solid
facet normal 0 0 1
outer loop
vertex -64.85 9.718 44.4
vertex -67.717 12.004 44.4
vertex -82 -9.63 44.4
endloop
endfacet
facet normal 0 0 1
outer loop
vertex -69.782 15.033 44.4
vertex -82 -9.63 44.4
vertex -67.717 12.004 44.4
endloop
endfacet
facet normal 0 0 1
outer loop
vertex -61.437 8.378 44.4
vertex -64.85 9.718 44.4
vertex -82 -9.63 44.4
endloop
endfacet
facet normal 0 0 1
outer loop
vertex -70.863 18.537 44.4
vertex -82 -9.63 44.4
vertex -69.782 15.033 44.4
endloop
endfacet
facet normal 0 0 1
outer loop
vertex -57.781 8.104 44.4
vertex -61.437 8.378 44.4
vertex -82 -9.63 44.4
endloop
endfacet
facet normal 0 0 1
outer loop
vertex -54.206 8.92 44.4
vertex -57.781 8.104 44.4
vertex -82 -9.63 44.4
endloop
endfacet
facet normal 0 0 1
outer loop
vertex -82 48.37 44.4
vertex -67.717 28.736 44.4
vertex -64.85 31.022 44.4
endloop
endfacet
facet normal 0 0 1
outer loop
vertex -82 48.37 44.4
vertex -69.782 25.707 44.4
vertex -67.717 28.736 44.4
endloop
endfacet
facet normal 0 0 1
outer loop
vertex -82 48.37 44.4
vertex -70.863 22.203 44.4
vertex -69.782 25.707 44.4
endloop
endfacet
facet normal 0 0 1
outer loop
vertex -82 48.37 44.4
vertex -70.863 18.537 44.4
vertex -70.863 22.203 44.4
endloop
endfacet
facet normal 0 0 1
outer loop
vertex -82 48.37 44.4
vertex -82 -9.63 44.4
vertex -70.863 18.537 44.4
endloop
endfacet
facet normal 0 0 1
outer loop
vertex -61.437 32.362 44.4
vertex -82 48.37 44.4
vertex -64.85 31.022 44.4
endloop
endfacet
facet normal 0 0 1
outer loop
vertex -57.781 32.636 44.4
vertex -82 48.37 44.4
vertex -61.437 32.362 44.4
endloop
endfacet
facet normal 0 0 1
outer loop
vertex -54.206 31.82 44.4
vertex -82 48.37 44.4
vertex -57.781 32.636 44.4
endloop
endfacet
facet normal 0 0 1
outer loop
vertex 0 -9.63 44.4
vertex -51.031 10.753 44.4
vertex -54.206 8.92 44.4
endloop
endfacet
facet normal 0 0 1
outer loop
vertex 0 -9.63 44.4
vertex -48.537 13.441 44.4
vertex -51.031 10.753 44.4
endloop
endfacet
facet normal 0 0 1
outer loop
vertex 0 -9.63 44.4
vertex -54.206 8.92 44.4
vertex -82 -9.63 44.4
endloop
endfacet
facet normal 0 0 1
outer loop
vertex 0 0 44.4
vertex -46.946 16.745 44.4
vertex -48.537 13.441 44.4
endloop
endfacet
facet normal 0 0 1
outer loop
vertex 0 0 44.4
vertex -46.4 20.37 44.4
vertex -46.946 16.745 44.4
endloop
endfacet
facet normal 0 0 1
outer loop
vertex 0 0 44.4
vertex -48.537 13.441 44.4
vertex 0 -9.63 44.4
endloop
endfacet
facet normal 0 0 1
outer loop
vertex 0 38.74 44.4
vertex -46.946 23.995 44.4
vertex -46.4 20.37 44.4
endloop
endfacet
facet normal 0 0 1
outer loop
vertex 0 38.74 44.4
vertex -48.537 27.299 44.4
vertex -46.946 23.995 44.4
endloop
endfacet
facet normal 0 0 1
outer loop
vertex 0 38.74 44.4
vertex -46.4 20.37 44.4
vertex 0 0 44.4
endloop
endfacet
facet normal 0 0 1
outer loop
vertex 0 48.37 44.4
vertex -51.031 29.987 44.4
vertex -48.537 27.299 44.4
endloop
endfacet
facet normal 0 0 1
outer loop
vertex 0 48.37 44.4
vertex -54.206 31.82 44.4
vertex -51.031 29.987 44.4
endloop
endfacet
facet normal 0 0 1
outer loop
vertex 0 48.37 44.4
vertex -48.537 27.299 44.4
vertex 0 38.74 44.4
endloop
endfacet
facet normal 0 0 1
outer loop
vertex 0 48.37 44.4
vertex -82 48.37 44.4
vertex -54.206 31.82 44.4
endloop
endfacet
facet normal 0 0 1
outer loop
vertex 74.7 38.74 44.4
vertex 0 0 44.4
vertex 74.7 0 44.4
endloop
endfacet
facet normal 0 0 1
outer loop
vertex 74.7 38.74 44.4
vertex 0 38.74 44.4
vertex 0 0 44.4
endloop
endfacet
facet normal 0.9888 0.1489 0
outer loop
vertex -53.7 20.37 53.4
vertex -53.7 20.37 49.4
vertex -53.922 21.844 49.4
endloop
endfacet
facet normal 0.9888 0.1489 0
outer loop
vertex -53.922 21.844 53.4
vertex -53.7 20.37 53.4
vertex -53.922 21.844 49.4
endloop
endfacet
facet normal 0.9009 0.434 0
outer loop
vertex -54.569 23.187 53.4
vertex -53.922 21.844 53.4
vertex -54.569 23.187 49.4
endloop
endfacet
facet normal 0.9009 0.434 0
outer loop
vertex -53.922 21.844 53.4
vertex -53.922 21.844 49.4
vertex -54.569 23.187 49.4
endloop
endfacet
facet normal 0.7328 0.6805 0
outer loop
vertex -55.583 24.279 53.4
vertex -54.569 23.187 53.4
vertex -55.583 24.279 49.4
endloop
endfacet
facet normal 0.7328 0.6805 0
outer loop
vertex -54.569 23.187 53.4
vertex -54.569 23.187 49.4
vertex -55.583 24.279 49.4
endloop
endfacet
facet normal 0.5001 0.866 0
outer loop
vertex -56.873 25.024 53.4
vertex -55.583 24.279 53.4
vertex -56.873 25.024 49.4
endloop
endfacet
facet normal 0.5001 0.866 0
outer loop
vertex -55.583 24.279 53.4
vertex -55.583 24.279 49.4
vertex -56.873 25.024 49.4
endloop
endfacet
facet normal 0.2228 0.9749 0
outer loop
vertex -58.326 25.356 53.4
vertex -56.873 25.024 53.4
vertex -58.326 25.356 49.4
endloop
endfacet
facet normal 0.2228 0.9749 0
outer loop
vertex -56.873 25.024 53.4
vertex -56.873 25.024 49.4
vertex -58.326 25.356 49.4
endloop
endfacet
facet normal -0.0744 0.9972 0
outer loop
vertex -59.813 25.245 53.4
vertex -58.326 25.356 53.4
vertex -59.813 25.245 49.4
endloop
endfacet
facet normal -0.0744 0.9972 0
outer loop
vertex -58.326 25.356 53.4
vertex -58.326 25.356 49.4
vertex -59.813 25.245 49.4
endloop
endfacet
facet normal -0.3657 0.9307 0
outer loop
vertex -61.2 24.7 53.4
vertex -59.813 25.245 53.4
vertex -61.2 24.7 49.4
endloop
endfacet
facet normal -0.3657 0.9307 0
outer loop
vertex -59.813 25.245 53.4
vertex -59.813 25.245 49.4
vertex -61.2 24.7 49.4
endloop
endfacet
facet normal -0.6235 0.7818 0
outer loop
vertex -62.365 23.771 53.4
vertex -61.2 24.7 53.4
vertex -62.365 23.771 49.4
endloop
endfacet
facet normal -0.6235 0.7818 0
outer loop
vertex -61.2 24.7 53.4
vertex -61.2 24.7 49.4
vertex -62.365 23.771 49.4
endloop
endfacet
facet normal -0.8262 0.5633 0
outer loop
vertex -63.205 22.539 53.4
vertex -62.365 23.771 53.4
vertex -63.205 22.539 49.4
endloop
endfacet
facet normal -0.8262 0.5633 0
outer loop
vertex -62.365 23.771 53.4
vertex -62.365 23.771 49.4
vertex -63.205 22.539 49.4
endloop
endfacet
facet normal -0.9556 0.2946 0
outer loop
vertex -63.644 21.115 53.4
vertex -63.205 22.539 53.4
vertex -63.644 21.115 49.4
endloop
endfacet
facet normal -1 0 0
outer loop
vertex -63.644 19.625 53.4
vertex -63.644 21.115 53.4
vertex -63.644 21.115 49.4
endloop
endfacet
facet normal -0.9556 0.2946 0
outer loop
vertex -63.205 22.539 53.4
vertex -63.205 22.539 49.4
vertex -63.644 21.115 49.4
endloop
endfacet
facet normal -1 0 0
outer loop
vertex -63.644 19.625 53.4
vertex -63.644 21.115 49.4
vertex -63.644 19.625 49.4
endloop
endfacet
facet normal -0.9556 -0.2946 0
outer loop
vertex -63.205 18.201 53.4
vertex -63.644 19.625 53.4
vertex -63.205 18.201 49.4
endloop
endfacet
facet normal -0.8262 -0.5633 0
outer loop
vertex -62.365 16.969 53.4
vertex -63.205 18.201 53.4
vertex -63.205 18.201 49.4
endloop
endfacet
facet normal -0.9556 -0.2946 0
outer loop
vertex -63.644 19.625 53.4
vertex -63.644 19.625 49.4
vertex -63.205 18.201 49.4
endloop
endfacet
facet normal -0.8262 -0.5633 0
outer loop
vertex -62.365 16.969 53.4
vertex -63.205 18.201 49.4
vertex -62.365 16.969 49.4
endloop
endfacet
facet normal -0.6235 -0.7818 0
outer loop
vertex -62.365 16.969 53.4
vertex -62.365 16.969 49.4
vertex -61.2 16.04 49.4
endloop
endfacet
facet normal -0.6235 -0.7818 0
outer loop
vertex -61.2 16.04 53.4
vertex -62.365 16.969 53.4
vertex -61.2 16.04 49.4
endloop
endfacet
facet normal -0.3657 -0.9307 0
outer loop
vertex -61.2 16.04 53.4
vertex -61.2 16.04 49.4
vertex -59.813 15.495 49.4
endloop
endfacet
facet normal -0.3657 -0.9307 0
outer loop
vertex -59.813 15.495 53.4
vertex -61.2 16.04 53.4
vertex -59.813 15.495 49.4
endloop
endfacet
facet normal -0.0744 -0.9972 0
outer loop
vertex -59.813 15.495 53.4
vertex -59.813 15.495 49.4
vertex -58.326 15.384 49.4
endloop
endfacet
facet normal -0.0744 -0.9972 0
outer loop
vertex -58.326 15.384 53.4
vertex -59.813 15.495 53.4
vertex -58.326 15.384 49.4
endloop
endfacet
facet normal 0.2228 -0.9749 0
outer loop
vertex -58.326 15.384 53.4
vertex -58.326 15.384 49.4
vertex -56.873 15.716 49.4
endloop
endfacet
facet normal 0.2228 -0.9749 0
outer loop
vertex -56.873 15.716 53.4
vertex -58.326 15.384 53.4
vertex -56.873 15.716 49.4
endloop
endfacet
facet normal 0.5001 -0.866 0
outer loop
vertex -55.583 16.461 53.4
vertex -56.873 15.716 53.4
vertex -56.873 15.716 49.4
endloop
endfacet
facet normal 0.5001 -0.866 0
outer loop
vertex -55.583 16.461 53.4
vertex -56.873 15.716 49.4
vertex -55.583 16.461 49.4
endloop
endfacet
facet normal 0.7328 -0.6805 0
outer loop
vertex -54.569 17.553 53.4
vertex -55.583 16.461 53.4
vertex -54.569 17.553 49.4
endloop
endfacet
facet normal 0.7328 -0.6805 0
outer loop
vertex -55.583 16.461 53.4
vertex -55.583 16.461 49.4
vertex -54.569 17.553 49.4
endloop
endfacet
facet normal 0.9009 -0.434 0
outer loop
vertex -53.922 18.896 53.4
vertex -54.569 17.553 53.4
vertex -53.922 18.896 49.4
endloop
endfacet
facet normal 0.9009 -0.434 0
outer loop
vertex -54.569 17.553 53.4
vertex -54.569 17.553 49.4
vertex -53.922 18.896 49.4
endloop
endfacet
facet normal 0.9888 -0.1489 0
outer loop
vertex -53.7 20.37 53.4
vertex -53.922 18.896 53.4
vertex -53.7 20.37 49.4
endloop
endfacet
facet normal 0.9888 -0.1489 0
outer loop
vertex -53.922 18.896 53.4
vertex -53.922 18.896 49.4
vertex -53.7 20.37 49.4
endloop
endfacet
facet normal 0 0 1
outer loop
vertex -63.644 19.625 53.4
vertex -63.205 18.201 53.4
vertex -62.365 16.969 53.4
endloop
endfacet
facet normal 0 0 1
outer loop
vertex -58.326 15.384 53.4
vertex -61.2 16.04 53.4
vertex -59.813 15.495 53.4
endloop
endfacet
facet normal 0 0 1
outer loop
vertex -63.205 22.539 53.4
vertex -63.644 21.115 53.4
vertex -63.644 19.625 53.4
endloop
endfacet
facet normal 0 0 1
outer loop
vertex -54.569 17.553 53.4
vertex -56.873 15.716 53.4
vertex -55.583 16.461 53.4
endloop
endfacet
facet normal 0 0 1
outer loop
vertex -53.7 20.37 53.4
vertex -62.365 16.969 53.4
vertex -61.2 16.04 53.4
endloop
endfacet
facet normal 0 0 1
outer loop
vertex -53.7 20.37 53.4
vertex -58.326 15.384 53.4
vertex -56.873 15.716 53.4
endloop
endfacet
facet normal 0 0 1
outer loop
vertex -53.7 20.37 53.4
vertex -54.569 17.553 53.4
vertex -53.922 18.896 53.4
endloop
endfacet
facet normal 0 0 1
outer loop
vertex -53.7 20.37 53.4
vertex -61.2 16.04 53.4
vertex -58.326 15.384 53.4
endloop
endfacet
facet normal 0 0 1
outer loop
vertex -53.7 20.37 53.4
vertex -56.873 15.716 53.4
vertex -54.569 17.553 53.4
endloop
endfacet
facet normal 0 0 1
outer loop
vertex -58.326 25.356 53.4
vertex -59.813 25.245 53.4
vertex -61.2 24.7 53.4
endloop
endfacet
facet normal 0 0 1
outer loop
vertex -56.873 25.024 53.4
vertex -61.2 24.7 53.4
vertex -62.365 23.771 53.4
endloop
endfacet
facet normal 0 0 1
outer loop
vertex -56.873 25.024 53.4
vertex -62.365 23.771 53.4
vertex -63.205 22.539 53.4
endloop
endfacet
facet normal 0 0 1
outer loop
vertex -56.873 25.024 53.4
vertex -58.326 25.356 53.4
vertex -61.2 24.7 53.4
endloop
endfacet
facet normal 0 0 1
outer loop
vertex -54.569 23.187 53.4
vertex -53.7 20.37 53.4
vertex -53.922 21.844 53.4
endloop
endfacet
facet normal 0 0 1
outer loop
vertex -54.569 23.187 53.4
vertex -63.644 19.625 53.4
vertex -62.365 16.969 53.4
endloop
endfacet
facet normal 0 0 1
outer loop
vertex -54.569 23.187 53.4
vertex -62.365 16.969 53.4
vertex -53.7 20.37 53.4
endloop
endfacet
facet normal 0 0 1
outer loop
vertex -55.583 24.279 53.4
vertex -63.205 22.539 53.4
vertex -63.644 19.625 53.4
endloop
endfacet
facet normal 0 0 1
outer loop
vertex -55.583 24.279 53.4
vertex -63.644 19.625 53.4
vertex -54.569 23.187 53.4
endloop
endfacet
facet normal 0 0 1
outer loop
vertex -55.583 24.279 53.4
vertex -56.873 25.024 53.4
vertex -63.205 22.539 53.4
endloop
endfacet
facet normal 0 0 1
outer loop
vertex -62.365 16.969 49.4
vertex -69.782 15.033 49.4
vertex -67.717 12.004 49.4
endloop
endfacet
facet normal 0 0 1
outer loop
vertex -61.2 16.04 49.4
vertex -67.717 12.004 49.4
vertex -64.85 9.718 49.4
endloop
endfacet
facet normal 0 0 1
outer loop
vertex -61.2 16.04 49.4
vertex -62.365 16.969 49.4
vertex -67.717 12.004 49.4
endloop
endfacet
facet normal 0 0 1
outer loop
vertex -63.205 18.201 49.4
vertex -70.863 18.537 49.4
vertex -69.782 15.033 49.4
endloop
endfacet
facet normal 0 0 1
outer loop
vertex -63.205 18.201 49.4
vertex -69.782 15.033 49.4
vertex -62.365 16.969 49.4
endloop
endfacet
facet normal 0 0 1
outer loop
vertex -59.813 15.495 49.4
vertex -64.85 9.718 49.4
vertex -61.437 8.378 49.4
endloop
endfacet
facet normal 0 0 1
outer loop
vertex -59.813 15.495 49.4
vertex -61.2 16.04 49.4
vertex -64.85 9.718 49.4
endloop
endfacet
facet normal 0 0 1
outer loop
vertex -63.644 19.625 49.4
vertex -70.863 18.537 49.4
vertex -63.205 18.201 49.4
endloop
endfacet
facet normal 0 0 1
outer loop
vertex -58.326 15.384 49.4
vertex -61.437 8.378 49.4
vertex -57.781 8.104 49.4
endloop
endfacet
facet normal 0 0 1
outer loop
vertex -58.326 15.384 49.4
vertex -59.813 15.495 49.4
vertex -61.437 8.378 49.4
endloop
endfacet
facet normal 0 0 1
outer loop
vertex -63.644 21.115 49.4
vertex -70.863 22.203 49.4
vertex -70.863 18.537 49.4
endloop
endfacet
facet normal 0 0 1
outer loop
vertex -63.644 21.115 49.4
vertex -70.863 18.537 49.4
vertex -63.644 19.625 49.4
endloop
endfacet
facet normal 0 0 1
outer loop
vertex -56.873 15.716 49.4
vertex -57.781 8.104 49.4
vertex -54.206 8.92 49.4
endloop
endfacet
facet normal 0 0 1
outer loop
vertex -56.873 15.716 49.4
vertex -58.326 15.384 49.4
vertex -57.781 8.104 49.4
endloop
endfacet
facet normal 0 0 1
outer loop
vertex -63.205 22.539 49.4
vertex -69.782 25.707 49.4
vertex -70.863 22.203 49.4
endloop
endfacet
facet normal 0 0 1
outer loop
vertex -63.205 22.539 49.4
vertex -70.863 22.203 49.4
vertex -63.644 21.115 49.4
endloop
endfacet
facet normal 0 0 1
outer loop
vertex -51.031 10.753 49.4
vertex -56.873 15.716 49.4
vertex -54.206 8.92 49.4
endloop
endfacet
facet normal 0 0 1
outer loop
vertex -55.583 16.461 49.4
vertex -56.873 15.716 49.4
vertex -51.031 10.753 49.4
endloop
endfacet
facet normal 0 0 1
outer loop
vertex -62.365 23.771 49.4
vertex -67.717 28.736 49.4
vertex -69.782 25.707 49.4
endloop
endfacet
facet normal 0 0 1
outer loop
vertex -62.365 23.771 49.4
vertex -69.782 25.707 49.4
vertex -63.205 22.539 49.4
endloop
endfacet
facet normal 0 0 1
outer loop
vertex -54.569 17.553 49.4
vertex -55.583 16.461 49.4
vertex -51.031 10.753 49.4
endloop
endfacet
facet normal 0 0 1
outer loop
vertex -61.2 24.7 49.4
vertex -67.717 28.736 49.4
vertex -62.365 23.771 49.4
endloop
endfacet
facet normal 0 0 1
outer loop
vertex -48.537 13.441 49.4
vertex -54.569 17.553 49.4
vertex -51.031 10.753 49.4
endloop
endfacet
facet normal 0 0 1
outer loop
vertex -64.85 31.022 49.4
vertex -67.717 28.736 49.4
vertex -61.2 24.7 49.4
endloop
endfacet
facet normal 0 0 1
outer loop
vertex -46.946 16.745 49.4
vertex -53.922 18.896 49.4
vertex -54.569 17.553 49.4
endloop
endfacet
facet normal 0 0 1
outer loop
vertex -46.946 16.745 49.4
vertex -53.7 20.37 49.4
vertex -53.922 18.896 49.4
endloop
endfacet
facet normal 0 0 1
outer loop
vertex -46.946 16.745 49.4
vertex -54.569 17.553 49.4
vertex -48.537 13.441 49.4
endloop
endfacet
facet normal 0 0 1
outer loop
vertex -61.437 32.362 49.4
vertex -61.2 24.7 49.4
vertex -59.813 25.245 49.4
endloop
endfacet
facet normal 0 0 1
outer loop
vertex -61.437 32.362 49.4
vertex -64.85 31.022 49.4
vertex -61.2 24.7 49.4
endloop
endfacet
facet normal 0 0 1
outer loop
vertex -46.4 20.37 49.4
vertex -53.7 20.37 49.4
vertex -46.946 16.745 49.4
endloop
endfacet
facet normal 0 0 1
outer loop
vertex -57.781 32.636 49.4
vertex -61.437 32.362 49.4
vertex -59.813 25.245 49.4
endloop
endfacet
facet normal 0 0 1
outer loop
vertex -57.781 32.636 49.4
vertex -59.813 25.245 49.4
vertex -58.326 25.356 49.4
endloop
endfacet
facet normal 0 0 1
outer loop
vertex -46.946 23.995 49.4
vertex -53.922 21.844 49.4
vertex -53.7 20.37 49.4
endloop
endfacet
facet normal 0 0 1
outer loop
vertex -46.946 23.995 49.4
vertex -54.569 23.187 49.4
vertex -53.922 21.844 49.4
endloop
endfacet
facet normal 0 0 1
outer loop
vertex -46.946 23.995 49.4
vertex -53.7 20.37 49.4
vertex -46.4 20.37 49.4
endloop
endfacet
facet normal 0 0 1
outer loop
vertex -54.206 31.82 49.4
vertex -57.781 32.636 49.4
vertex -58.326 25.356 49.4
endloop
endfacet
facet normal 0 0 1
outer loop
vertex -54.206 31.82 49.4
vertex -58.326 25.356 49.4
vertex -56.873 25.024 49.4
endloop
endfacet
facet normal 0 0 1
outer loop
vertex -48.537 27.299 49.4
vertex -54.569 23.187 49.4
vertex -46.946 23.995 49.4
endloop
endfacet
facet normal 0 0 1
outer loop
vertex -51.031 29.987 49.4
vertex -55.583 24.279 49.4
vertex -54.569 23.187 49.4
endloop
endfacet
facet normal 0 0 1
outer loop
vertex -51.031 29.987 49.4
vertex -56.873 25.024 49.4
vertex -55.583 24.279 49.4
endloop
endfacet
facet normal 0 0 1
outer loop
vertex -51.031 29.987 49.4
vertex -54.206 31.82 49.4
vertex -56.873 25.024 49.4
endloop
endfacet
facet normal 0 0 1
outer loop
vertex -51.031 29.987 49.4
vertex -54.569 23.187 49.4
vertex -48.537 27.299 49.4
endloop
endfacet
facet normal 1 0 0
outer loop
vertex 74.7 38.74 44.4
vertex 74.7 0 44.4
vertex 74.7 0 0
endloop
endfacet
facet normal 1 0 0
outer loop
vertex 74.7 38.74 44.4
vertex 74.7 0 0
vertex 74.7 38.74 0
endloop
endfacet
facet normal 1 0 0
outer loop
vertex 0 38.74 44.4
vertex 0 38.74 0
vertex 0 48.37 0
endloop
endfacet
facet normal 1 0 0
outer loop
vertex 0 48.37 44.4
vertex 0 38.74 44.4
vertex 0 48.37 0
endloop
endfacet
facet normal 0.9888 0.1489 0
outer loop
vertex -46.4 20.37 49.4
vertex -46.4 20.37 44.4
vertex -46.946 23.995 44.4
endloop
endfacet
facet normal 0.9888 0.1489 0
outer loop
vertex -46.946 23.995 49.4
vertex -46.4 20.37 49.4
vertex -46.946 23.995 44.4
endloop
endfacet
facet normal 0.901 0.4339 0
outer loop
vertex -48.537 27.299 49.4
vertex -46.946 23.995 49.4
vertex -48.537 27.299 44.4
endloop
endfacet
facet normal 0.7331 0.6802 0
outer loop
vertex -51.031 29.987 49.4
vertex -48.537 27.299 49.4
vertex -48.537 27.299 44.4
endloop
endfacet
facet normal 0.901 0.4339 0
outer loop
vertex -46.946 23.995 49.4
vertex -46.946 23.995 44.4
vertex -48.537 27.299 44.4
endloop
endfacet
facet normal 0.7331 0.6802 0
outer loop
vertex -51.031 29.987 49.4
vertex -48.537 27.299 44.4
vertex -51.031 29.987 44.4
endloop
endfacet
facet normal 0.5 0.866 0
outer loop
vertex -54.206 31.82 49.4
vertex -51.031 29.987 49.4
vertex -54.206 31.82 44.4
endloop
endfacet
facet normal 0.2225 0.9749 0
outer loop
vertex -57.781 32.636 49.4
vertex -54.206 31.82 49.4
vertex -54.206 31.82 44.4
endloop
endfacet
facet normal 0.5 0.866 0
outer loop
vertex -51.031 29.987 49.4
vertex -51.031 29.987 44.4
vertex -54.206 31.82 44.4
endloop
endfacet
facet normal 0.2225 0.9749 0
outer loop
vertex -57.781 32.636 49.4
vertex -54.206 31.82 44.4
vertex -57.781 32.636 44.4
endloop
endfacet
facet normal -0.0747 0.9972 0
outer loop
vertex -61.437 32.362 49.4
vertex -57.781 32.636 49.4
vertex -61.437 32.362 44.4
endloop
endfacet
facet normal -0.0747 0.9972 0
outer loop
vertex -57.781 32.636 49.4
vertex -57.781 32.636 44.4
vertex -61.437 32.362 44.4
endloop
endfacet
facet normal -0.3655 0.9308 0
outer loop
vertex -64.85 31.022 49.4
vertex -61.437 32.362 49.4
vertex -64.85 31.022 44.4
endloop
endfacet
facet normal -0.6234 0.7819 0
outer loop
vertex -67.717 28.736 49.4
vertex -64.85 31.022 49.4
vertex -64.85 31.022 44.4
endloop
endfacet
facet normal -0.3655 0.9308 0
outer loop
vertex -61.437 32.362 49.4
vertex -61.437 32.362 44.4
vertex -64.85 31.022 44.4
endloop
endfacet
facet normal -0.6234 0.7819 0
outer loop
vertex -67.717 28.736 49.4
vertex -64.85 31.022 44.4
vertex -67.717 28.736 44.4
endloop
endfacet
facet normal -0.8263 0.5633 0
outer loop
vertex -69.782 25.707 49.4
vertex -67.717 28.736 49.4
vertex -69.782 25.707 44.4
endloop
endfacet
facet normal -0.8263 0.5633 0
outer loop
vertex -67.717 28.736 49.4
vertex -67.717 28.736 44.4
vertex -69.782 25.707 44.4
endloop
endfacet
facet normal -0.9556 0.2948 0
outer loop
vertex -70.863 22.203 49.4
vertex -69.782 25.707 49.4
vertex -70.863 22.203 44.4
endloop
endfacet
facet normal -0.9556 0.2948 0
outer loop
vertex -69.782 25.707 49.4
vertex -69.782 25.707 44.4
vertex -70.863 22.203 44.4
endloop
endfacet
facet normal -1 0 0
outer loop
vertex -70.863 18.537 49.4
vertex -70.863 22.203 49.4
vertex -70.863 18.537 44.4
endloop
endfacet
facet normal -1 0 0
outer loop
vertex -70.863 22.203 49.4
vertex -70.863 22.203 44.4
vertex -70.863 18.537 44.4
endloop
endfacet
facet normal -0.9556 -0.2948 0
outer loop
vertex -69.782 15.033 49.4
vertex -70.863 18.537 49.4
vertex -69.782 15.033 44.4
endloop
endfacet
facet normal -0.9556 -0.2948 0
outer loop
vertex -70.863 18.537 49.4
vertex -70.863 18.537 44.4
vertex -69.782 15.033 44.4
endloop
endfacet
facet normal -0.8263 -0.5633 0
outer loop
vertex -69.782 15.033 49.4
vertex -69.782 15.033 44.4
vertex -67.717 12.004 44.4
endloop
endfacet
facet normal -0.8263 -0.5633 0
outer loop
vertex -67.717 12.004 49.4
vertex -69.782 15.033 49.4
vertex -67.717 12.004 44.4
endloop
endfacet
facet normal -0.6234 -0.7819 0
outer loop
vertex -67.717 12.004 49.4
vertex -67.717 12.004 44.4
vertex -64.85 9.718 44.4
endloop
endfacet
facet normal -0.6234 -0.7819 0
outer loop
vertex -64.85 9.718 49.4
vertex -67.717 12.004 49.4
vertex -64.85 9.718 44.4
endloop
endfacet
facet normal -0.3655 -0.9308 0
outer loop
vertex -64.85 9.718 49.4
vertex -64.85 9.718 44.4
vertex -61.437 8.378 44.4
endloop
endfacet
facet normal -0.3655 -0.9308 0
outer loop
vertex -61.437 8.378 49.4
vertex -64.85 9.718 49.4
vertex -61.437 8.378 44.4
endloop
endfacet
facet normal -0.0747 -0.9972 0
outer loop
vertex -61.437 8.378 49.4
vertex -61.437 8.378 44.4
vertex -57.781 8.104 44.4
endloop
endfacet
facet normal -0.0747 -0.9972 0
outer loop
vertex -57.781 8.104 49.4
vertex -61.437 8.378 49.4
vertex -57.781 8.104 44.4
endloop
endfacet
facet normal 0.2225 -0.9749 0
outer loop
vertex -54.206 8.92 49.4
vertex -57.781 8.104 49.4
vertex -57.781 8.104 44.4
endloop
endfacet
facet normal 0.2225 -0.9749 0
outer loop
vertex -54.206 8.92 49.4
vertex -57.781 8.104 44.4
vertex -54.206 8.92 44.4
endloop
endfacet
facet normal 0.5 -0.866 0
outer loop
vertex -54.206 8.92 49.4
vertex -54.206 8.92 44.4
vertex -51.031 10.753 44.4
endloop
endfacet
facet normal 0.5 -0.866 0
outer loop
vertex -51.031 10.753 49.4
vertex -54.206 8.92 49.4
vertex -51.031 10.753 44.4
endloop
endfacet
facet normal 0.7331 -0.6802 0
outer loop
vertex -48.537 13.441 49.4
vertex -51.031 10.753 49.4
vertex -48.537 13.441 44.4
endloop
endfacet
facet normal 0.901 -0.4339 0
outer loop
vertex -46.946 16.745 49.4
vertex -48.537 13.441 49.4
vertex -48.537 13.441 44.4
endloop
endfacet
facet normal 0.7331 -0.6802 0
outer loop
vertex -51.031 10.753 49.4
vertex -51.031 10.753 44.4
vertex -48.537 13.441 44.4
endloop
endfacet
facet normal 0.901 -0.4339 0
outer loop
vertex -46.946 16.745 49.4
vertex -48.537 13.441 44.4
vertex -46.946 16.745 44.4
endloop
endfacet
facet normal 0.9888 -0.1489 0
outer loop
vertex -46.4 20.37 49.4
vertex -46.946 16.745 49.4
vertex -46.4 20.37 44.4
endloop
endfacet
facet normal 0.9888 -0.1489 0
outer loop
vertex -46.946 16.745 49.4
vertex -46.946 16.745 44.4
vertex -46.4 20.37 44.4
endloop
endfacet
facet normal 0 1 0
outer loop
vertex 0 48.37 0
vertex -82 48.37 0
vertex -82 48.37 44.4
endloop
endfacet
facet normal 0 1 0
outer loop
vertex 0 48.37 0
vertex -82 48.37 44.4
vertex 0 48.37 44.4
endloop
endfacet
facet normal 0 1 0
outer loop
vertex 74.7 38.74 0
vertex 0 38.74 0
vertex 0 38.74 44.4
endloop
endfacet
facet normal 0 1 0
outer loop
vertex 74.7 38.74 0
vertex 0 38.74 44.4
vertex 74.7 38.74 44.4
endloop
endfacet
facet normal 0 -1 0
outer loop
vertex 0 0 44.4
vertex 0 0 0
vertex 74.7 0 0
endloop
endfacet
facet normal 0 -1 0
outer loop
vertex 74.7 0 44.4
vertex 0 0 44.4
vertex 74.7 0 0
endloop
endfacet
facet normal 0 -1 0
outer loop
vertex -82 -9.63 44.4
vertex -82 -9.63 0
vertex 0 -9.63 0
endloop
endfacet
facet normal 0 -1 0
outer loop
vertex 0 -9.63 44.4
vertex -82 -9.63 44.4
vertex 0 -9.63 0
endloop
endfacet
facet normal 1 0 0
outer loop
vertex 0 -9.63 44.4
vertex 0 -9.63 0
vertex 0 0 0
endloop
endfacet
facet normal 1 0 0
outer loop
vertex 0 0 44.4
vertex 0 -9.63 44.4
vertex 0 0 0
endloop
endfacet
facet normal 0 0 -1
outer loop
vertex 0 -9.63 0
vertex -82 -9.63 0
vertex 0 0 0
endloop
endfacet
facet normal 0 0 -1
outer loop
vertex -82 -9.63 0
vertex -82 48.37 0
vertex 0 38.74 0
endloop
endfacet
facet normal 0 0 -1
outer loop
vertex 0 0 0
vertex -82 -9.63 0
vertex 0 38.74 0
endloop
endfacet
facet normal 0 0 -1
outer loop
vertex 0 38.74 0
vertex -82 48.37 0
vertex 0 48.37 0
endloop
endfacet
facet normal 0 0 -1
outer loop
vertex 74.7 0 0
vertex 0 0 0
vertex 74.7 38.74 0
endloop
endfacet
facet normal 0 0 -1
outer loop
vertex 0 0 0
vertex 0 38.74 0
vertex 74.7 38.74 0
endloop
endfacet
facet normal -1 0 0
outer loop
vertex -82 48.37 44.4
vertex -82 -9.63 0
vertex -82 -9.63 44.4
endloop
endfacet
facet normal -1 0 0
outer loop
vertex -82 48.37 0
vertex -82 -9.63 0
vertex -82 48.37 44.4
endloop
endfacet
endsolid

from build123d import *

# Parameters (mm, degrees)
SKETCH001_R      = 5
EXTRUDE001_DEPTH = 4
SKETCH_R         = 12.3
EXTRUDE_DEPTH    = 5
BOX001_W         = 82
BOX001_H         = 58
BOX001_DEPTH     = 44.4
BOX_W            = 74.7
BOX_H            = 38.74
BOX_DEPTH        = 44.4


with BuildPart() as extrude001:
    # Sketch001 (on Face3 of Extrude) → Extrude001 (new body)
    with BuildSketch(Plane.XY.offset(49.4)):
        with Locations((-58.7, 20.37)):
            Circle(SKETCH001_R)
    extrude(amount=EXTRUDE001_DEPTH)


with BuildPart() as extrude_body:
    # Sketch (on Face6 of Box001) → Extrude (new body)
    with BuildSketch(Plane(origin=(-82, -9.63, 44.4), x_dir=(1, 0, 0), z_dir=(0, 0, 1))):
        with Locations((23.3, 30)):
            Circle(SKETCH_R)
    extrude(amount=EXTRUDE_DEPTH)


with BuildPart() as cube001:
    # Box001 → Box001 (new body)
    with BuildSketch(Plane(origin=(-82, -9.63, 0), x_dir=(1, 0, 0), z_dir=(0, 0, 1))):
        with Locations((41, 29)):
            Rectangle(BOX001_W, BOX001_H)
    extrude(amount=BOX001_DEPTH)


with BuildPart() as fusion003:
    # Box → Box (new body)
    with BuildSketch(Plane.XY):
        with Locations((37.35, 19.37)):
            Rectangle(BOX_W, BOX_H)
    extrude(amount=BOX_DEPTH)

    # Fusion: union Cube001
    add(cube001.part)

    # Fusion002: union Extrude body
    add(extrude_body.part)

    # Fusion003: union Extrude001
    add(extrude001.part)


solid = fusion003.part
